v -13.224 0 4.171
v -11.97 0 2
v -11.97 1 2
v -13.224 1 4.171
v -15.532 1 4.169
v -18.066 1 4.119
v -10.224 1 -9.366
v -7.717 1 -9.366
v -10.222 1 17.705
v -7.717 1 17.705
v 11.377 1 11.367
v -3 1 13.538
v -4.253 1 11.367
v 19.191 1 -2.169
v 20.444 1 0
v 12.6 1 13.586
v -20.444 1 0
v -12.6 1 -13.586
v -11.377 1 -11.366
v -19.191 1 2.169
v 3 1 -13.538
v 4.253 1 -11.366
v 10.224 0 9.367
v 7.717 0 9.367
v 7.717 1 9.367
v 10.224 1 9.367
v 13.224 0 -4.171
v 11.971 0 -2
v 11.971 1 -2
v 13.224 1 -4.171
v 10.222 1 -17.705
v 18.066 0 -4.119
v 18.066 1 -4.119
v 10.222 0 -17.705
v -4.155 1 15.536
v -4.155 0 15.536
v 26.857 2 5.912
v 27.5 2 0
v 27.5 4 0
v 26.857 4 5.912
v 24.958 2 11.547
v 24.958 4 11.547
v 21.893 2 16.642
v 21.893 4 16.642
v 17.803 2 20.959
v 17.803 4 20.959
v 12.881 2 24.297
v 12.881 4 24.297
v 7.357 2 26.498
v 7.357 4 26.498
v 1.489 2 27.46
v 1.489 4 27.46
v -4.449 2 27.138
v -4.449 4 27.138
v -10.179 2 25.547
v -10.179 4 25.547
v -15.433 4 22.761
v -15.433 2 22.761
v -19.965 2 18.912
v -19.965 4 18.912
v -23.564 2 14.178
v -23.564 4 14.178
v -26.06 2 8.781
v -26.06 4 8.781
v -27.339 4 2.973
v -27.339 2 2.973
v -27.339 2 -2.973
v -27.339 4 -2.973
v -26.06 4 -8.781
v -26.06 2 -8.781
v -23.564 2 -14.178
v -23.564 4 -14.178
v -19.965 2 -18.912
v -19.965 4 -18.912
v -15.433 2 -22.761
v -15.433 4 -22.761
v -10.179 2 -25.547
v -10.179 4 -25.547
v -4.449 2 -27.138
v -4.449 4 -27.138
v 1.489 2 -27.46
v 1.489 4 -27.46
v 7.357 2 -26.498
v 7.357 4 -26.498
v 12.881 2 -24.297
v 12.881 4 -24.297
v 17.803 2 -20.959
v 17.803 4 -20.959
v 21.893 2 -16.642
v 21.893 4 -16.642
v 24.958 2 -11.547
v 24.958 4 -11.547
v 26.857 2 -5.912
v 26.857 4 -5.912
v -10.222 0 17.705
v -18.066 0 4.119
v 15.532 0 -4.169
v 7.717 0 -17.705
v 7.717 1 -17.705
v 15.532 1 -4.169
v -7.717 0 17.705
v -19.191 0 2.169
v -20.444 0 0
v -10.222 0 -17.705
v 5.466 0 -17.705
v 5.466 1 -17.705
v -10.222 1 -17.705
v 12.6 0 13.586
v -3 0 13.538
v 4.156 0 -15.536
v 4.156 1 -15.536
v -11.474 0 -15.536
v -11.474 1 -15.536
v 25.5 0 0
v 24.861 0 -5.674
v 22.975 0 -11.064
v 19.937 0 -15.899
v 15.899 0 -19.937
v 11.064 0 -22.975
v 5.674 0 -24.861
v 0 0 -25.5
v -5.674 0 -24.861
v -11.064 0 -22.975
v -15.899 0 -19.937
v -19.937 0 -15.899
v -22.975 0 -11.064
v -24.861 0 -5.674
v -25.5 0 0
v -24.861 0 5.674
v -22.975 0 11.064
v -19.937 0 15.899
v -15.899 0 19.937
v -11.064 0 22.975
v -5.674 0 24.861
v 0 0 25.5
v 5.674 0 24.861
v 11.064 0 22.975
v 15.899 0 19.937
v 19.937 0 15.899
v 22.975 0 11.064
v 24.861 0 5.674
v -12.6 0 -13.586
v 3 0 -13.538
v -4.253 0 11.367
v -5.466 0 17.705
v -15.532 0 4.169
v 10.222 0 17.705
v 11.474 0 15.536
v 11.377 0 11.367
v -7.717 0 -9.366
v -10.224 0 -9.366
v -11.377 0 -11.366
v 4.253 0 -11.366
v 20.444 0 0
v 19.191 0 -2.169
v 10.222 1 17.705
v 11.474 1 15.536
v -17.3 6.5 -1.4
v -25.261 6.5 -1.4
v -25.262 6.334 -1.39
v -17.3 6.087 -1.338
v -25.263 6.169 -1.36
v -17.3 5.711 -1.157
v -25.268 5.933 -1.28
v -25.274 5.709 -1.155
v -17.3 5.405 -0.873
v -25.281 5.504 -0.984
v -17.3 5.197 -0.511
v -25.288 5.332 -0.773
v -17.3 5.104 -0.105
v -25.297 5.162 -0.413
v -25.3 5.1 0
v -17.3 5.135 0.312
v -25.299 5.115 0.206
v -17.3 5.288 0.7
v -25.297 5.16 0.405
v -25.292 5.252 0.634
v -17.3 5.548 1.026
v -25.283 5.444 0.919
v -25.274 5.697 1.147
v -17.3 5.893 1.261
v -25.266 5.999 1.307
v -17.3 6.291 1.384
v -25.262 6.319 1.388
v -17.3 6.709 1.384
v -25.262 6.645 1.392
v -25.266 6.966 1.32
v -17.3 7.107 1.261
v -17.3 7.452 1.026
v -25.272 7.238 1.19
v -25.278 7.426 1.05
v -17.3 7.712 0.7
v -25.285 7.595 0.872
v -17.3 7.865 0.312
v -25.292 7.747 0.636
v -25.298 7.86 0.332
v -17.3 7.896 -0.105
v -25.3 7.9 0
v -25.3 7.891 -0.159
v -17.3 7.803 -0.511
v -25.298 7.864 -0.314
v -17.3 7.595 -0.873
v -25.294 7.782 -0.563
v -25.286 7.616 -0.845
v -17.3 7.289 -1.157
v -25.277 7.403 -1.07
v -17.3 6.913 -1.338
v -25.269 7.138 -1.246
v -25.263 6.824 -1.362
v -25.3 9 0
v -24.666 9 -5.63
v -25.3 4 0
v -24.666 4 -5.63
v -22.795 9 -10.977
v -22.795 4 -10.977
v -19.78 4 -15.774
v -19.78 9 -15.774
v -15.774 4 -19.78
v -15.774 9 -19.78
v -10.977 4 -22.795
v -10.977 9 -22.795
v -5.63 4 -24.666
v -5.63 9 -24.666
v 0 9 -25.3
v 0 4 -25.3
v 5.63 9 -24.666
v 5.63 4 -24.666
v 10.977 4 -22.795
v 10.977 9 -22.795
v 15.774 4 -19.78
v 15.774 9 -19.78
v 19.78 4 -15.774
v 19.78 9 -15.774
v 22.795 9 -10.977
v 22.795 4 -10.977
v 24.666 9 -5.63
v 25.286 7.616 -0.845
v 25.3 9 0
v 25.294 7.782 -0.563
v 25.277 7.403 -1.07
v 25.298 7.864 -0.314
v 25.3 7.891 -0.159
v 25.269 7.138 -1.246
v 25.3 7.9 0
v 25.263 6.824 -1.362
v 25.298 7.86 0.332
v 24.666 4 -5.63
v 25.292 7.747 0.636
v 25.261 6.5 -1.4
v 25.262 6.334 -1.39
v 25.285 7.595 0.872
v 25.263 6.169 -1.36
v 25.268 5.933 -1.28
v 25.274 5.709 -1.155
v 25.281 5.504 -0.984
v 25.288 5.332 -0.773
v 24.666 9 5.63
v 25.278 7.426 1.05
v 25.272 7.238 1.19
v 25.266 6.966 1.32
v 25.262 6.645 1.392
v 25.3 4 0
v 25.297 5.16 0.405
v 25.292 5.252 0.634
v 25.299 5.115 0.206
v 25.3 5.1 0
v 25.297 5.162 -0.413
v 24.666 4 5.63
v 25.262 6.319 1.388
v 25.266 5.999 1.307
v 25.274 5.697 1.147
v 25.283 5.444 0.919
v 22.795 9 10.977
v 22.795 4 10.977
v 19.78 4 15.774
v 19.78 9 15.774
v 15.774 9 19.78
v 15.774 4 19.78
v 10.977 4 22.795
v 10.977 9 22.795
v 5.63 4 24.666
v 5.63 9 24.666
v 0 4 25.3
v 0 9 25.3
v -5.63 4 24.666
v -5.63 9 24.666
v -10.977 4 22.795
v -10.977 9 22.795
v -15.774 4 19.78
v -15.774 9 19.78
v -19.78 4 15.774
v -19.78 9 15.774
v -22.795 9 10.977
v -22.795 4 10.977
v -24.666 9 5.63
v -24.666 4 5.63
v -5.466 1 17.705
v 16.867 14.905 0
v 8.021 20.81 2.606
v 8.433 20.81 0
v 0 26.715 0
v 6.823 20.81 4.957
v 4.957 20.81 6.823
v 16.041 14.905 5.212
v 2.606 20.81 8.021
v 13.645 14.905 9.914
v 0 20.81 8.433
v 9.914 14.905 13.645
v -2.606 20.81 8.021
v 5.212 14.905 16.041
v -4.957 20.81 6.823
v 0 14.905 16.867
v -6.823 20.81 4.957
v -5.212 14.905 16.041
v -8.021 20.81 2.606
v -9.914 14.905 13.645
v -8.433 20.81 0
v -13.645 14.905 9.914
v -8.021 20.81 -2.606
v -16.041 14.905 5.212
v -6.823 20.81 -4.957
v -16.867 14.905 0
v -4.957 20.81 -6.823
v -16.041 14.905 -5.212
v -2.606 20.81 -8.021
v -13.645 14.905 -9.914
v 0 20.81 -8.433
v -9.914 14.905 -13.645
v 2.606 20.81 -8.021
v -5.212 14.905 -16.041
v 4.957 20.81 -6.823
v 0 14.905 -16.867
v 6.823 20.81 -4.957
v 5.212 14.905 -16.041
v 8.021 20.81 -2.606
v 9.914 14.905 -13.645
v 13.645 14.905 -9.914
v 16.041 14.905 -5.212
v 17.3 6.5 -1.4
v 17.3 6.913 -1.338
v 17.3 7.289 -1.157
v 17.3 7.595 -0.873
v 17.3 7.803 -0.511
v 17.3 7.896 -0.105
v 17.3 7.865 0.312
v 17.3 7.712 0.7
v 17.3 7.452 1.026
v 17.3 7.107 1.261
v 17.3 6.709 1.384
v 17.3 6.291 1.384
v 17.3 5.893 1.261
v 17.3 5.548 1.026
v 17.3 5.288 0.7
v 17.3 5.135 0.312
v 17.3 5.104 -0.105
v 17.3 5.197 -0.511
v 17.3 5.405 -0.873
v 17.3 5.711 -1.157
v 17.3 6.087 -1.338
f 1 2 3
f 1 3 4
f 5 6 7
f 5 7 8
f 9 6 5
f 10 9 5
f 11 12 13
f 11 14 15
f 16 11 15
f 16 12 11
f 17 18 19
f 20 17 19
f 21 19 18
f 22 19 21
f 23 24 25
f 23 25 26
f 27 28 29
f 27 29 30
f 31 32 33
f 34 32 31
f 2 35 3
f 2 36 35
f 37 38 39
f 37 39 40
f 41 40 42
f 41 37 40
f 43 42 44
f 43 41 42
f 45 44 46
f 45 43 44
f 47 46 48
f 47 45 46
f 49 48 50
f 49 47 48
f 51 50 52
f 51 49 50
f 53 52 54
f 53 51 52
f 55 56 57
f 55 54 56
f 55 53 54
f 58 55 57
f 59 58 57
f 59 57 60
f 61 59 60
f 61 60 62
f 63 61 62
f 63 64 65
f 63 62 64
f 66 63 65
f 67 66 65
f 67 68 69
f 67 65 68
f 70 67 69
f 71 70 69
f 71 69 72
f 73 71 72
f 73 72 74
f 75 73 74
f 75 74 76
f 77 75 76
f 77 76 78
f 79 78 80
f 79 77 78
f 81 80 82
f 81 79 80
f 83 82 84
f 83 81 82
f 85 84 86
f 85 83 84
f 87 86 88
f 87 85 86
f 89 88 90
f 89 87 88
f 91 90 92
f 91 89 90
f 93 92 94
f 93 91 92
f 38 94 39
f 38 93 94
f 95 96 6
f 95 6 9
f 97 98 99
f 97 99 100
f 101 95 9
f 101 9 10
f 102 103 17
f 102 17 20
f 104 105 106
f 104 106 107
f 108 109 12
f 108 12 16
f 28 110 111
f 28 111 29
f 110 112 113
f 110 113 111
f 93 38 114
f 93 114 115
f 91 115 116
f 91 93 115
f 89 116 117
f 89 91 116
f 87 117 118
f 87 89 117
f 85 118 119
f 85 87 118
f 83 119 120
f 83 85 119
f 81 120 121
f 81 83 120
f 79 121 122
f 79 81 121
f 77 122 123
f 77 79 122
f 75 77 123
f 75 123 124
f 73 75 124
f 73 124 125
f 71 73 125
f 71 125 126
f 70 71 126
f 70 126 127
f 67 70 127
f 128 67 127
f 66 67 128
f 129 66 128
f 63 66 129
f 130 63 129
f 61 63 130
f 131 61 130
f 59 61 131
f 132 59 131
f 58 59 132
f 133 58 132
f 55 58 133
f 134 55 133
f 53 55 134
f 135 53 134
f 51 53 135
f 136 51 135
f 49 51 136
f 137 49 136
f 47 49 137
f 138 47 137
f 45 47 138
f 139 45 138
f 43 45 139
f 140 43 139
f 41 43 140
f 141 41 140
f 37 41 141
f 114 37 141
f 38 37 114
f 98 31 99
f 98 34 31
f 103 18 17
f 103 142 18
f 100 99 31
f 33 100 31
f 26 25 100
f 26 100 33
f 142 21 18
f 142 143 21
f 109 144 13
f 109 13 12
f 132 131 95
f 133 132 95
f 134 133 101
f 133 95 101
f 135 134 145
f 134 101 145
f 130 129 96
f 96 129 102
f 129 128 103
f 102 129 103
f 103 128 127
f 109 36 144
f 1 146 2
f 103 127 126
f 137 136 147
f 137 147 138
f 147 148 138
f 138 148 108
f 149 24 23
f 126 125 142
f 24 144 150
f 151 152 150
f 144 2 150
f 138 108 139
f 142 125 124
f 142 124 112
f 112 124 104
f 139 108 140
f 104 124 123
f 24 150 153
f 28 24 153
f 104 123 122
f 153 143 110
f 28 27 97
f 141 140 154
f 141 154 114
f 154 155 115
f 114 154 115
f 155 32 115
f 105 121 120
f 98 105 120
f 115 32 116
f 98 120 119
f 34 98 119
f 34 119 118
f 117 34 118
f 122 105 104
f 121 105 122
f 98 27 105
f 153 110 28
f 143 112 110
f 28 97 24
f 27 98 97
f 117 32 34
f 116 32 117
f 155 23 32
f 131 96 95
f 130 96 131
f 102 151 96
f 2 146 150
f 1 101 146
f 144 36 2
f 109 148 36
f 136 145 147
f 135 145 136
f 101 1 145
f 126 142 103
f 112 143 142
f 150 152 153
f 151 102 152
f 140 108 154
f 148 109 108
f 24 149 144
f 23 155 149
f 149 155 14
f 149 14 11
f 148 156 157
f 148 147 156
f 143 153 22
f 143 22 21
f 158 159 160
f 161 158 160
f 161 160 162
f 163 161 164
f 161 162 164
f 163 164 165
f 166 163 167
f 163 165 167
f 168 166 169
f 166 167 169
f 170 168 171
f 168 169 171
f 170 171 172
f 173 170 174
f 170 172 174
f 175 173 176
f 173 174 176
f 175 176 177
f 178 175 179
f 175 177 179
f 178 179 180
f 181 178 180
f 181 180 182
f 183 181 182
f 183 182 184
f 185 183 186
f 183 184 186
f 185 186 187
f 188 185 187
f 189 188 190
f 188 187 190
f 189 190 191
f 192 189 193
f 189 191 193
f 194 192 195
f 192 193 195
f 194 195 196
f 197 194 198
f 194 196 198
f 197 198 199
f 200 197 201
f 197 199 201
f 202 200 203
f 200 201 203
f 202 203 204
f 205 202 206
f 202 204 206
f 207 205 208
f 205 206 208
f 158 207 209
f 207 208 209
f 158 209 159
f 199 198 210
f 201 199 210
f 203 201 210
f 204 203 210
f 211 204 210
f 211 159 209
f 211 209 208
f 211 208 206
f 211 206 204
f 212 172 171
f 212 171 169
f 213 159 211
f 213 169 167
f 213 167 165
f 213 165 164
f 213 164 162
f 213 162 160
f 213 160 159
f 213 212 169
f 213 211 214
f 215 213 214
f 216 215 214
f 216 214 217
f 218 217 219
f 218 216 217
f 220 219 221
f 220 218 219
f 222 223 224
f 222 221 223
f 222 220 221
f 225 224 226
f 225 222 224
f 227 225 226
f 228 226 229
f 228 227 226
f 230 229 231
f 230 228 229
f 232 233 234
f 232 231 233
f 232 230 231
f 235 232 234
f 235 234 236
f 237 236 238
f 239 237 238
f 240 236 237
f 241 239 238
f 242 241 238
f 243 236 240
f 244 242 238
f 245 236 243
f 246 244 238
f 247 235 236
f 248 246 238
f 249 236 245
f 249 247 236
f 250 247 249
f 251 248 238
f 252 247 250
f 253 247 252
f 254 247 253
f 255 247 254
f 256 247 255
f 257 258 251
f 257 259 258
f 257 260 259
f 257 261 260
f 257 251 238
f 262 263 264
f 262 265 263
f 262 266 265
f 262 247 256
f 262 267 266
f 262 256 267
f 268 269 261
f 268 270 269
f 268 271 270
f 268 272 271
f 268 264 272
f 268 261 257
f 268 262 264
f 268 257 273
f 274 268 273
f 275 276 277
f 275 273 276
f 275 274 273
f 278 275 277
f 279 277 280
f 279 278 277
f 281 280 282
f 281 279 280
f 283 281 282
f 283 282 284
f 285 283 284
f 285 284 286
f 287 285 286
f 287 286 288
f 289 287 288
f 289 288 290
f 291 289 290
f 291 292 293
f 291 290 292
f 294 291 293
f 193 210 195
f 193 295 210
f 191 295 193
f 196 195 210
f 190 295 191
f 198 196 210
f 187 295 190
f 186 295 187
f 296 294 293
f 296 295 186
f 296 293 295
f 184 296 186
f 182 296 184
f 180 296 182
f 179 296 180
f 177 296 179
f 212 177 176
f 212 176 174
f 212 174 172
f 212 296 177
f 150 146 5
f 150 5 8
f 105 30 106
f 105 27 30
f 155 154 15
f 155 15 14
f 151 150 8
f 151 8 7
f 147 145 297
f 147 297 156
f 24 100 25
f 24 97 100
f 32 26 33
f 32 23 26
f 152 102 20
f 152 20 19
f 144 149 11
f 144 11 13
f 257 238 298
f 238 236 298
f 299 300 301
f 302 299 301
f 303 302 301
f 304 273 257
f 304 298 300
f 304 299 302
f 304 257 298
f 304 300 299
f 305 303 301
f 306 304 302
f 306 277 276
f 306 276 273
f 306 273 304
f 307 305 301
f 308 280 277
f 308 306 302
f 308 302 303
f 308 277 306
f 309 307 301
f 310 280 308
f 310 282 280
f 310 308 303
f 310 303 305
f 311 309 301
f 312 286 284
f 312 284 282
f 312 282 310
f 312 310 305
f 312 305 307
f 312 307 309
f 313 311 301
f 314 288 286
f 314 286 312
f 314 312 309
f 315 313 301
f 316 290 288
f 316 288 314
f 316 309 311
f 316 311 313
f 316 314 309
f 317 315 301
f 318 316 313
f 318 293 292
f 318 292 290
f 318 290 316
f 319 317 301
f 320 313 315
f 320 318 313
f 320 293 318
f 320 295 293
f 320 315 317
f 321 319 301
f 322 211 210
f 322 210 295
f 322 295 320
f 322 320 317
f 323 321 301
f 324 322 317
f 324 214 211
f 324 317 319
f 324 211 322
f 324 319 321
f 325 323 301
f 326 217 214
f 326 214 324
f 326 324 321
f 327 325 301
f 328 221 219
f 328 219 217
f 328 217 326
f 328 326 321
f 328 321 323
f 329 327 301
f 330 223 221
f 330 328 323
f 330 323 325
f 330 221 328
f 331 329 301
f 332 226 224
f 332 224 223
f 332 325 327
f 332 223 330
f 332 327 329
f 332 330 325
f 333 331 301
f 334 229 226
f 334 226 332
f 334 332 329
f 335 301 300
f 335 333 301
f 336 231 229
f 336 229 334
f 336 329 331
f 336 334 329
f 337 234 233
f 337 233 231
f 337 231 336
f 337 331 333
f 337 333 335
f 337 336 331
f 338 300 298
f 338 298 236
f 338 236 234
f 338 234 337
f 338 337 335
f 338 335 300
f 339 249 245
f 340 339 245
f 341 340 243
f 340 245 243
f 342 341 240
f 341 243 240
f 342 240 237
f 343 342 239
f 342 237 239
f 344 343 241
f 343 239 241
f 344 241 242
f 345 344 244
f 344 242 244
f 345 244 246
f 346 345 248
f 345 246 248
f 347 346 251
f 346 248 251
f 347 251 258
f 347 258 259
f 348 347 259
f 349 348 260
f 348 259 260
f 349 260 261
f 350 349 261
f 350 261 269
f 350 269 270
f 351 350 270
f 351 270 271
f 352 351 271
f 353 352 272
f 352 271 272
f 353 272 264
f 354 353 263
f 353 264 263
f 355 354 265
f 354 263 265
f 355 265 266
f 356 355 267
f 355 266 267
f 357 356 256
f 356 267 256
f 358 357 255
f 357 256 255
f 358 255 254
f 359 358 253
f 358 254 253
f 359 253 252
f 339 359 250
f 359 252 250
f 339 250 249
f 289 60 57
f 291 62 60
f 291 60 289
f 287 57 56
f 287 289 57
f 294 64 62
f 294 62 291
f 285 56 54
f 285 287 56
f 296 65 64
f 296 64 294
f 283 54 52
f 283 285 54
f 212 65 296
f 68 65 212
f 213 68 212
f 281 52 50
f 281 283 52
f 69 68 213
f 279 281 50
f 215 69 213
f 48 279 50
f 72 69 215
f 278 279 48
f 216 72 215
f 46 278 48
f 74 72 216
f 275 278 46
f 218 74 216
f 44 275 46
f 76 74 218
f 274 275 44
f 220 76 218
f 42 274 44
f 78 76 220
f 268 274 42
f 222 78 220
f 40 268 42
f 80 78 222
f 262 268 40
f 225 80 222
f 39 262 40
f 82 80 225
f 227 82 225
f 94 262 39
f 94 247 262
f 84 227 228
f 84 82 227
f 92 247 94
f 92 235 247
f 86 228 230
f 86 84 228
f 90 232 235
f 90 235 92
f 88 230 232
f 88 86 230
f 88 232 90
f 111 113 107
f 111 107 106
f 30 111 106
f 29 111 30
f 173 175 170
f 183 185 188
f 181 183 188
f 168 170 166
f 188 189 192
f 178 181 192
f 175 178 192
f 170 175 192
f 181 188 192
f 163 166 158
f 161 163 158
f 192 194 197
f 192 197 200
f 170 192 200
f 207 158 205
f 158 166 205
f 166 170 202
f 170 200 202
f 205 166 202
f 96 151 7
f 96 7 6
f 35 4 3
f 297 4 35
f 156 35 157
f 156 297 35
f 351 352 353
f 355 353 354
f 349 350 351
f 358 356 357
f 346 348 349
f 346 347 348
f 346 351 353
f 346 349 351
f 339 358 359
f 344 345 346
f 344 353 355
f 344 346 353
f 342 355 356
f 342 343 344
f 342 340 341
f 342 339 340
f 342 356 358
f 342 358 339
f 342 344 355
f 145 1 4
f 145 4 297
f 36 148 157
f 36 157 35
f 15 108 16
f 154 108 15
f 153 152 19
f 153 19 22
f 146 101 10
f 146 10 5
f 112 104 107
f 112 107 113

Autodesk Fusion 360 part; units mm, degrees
sketch "Sketch1" plane through (0, 0, 0) normal (0, 1, 0) x (1, 0, 0)
  circle A0 centre (0, 0) radius 27.5
  dimension "d1" = 55
extrude "Extrude1" add sketch "Sketch1" along normal blind 4
sketch "Sketch2" plane through (0, 4, 0) normal (0, 1, 0) x (-1, 0, 0)
  circle A0 centre (0, 0) radius 27.5
  circle A1 centre (0, 0) radius 25.3
  dimension "d4" = 50.6
extrude "Extrude2" add sketch "Sketch2" along normal blind 5 contours A1
sketch "Sketch3" plane through (0, 0, 0) normal (0, -1, 0) x (1, 0, 0)
  circle A0 centre (0, 0) radius 27.5
  line L0 (21.5985, 0) -> (19.1914, -4.1689)
  line L1 (3.5784, -14.5357) -> (-13.1761, -14.5877)
  line L2 (-11.9706, 0) -> (-14.3773, 4.1693)
  line L3 (-14.3773, 4.1693) -> (-5.9851, -10.3664)
  line L4 (14.3777, -4.1689) -> (6.0451, -18.7046)
  line L5 (5.9851, -10.3664) -> (3.5784, -14.5357)
  line L6 (-14.3773, 4.1693) -> (-6.0451, 18.705)
  line L7 (-5.9851, 18.705) -> (-14.3773, 4.1693)
  line L8 (-10.7992, -10.3664) -> (-19.2216, 4.1173)
  line L9 (-19.1914, 4.1693) -> (-10.7992, -10.3664)
  line L10 (-10.7992, -18.7046) -> (-13.2063, -14.5357)
  line L11 (-5.9851, -10.3664) -> (-10.7992, -10.3664)
  line L12 (-21.5985, 0) -> (-19.1914, 4.1693)
  line L13 (10.7992, 10.3668) -> (19.2216, -4.1169)
  line L14 (-10.7992, -10.3664) -> (5.9851, -10.3664)
  line L15 (-13.2063, -14.5357) -> (3.5784, -14.5357)
  line L16 (14.3777, -4.1689) -> (5.9851, 10.3668)
  line L17 (13.2063, 14.5357) -> (-3.578, 14.5357)
  line L18 (6.0451, -18.7046) -> (-10.7992, -18.7046)
  line L19 (11.9706, 0) -> (14.3777, -4.1689)
  line L20 (19.1914, -4.1689) -> (10.7992, 10.3668)
  line L21 (5.9851, -18.7046) -> (14.3777, -4.1689)
  line L22 (13.1765, 14.5877) -> (21.5985, 0)
  line L23 (-6.0451, 18.705) -> (10.7992, 18.705)
  line L24 (-3.578, 14.5357) -> (-11.9706, 0)
  line L25 (10.7992, 10.3668) -> (-5.9851, 10.3668)
  line L26 (10.7992, -18.7046) -> (5.9851, -18.7046)
  line L27 (19.2216, -4.1169) -> (10.7992, -18.7046)
  line L28 (10.7992, 18.705) -> (13.2063, 14.5357)
  line L29 (-11.9706, 0) -> (11.9706, 0)
  line L30 (0, 0) -> (0, 10.3668)
  line L31 (-19.2216, 4.1173) -> (-10.7992, 18.705)
  line L32 (-13.1761, -14.5877) -> (-21.5985, 0)
  line L33 (-10.7992, 18.705) -> (-5.9851, 18.705)
  line L34 (3.5784, -14.5357) -> (11.9706, 0)
  line L35 (5.9851, 10.3668) -> (10.7992, 10.3668)
  line L36 (-3.578, 14.5357) -> (13.1765, 14.5877)
  line L37 (-5.9851, 10.3668) -> (-3.578, 14.5357)
  line L38 (-13.2236, 4.171) -> (-5.4656, 17.705)
  line L39 (-5.4656, 17.705) -> (10.2219, 17.705)
  line L40 (10.2219, 17.705) -> (11.4743, 15.5357)
  line L41 (11.4743, 15.5357) -> (-4.1554, 15.5357)
  line L42 (-4.1554, 15.5357) -> (-11.9705, 2.0001)
  line L43 (-11.9705, 2.0001) -> (-13.2236, 4.171)
  line L44 (11.3766, 11.3668) -> (-4.253, 11.3668)
  line L45 (-4.253, 11.3668) -> (-2.9997, 13.5375)
  line L46 (-2.9997, 13.5375) -> (12.6002, 13.5859)
  line L47 (12.6002, 13.5859) -> (20.4438, 0)
  line L48 (20.4438, 0) -> (19.1914, -2.1689)
  line L49 (19.1914, -2.1689) -> (11.3766, 11.3668)
  line L50 (10.224, 9.3668) -> (18.0659, -4.1187)
  line L51 (18.0659, -4.1187) -> (10.2219, -17.7046)
  line L52 (10.2219, -17.7046) -> (7.7172, -17.7046)
  line L53 (7.7172, -17.7046) -> (15.5324, -4.1689)
  line L54 (15.5324, -4.1689) -> (7.7172, 9.3668)
  line L55 (7.7172, 9.3668) -> (10.224, 9.3668)
  line L56 (13.224, -4.1707) -> (5.4657, -17.7046)
  line L57 (5.4657, -17.7046) -> (-10.2219, -17.7046)
  line L58 (-10.2219, -17.7046) -> (-11.4742, -15.5357)
  line L59 (-11.4742, -15.5357) -> (4.1558, -15.5357)
  line L60 (4.1558, -15.5357) -> (11.9706, -2)
  line L61 (11.9706, -2) -> (13.224, -4.1707)
  line L62 (3, -13.5375) -> (-12.5998, -13.5859)
  line L63 (-12.5998, -13.5859) -> (-20.4438, 0)
  line L64 (-20.4438, 0) -> (-19.1914, 2.1693)
  line L65 (-19.1914, 2.1693) -> (-11.3766, -11.3664)
  line L66 (-11.3766, -11.3664) -> (4.2532, -11.3664)
  line L67 (4.2532, -11.3664) -> (3, -13.5375)
  line L68 (-10.224, -9.3664) -> (-18.0659, 4.1191)
  line L69 (-18.0659, 4.1191) -> (-10.2219, 17.705)
  line L70 (-10.2219, 17.705) -> (-7.7172, 17.705)
  line L71 (-7.7172, 17.705) -> (-15.532, 4.1693)
  line L72 (-15.532, 4.1693) -> (-7.7172, -9.3664)
  line L73 (-7.7172, -9.3664) -> (-10.224, -9.3664)
  dimension "d8" = 1
  dimension "d9" = 1
  dimension "d10" = 1
  dimension "d11" = 1
  dimension "d12" = 1
  dimension "d13" = 1
extrude "Extrude3" cut sketch "Sketch3" against normal blind 1 contours L38 L39 L40 L41 L42 L43 | L44 L45 L46 L47 L48 L49 | L50 L51 L52 L53 L54 L55 | L56 L57 L58 L59 L60 L61 | L62 L63 L64 L65 L66 L67 | L68 L69 L70 L71 L72 L73
chamfer "Chamfer1" distance 2 angle 45 1 edges at (-25.639, 0, 9.9444)
sketch "Sketch5" plane through (0, 0, 0) normal (0, 0, 1) x (1, 0, 0)
  line L0 (25.3, 9) -> (-25.3, 9)
  line L1 (25.3, 9) -> (0, 26.7153)
  line L2 (25.3, 9) -> (54.9449, 9) construction
  line L3 (0, 26.7153) -> (0, 9)
  line L4 (0, 26.7153) -> (0, 24.5)
  dimension "d19" = 145
  dimension "d37" = 30.8856
revolve "Revolve1" add sketch "Sketch5" angle 360 about axis through (0, 1.75, 0) along (0, 1, 0)
ref_plane "WorkPlane3" through (25.3, 0, 0) normal (1, 0, 0) x (0, 1, 0)
sketch "Sketch8" plane through (25.3, 0, 0) normal (1, 0, 0) x (0, 0, -1)
  line L0 (0, 9) -> (0, 6.5)
  circle A0 centre (0, 6.5) radius 1.4
  point P0 (0, 9)
  dimension "d28" = 2.5
  dimension "d29" = 2.8
extrude "Extrude6" cut sketch "Sketch8" against normal blind 8
ref_plane "WorkPlane4" through (-25.3, 0, 0) normal (1, 0, 0) x (0, 1, 0)
sketch "Sketch9" plane through (-25.3, 0, 0) normal (1, 0, 0) x (0, 0, -1)
  line L0 (0, 9) -> (0, 6.5)
  circle A0 centre (0, 6.5) radius 1.4
  point P0 (0, 9)
  dimension "d33" = 2.5
  dimension "d34" = 2.8
extrude "Extrude7" cut sketch "Sketch9" along normal blind 8
